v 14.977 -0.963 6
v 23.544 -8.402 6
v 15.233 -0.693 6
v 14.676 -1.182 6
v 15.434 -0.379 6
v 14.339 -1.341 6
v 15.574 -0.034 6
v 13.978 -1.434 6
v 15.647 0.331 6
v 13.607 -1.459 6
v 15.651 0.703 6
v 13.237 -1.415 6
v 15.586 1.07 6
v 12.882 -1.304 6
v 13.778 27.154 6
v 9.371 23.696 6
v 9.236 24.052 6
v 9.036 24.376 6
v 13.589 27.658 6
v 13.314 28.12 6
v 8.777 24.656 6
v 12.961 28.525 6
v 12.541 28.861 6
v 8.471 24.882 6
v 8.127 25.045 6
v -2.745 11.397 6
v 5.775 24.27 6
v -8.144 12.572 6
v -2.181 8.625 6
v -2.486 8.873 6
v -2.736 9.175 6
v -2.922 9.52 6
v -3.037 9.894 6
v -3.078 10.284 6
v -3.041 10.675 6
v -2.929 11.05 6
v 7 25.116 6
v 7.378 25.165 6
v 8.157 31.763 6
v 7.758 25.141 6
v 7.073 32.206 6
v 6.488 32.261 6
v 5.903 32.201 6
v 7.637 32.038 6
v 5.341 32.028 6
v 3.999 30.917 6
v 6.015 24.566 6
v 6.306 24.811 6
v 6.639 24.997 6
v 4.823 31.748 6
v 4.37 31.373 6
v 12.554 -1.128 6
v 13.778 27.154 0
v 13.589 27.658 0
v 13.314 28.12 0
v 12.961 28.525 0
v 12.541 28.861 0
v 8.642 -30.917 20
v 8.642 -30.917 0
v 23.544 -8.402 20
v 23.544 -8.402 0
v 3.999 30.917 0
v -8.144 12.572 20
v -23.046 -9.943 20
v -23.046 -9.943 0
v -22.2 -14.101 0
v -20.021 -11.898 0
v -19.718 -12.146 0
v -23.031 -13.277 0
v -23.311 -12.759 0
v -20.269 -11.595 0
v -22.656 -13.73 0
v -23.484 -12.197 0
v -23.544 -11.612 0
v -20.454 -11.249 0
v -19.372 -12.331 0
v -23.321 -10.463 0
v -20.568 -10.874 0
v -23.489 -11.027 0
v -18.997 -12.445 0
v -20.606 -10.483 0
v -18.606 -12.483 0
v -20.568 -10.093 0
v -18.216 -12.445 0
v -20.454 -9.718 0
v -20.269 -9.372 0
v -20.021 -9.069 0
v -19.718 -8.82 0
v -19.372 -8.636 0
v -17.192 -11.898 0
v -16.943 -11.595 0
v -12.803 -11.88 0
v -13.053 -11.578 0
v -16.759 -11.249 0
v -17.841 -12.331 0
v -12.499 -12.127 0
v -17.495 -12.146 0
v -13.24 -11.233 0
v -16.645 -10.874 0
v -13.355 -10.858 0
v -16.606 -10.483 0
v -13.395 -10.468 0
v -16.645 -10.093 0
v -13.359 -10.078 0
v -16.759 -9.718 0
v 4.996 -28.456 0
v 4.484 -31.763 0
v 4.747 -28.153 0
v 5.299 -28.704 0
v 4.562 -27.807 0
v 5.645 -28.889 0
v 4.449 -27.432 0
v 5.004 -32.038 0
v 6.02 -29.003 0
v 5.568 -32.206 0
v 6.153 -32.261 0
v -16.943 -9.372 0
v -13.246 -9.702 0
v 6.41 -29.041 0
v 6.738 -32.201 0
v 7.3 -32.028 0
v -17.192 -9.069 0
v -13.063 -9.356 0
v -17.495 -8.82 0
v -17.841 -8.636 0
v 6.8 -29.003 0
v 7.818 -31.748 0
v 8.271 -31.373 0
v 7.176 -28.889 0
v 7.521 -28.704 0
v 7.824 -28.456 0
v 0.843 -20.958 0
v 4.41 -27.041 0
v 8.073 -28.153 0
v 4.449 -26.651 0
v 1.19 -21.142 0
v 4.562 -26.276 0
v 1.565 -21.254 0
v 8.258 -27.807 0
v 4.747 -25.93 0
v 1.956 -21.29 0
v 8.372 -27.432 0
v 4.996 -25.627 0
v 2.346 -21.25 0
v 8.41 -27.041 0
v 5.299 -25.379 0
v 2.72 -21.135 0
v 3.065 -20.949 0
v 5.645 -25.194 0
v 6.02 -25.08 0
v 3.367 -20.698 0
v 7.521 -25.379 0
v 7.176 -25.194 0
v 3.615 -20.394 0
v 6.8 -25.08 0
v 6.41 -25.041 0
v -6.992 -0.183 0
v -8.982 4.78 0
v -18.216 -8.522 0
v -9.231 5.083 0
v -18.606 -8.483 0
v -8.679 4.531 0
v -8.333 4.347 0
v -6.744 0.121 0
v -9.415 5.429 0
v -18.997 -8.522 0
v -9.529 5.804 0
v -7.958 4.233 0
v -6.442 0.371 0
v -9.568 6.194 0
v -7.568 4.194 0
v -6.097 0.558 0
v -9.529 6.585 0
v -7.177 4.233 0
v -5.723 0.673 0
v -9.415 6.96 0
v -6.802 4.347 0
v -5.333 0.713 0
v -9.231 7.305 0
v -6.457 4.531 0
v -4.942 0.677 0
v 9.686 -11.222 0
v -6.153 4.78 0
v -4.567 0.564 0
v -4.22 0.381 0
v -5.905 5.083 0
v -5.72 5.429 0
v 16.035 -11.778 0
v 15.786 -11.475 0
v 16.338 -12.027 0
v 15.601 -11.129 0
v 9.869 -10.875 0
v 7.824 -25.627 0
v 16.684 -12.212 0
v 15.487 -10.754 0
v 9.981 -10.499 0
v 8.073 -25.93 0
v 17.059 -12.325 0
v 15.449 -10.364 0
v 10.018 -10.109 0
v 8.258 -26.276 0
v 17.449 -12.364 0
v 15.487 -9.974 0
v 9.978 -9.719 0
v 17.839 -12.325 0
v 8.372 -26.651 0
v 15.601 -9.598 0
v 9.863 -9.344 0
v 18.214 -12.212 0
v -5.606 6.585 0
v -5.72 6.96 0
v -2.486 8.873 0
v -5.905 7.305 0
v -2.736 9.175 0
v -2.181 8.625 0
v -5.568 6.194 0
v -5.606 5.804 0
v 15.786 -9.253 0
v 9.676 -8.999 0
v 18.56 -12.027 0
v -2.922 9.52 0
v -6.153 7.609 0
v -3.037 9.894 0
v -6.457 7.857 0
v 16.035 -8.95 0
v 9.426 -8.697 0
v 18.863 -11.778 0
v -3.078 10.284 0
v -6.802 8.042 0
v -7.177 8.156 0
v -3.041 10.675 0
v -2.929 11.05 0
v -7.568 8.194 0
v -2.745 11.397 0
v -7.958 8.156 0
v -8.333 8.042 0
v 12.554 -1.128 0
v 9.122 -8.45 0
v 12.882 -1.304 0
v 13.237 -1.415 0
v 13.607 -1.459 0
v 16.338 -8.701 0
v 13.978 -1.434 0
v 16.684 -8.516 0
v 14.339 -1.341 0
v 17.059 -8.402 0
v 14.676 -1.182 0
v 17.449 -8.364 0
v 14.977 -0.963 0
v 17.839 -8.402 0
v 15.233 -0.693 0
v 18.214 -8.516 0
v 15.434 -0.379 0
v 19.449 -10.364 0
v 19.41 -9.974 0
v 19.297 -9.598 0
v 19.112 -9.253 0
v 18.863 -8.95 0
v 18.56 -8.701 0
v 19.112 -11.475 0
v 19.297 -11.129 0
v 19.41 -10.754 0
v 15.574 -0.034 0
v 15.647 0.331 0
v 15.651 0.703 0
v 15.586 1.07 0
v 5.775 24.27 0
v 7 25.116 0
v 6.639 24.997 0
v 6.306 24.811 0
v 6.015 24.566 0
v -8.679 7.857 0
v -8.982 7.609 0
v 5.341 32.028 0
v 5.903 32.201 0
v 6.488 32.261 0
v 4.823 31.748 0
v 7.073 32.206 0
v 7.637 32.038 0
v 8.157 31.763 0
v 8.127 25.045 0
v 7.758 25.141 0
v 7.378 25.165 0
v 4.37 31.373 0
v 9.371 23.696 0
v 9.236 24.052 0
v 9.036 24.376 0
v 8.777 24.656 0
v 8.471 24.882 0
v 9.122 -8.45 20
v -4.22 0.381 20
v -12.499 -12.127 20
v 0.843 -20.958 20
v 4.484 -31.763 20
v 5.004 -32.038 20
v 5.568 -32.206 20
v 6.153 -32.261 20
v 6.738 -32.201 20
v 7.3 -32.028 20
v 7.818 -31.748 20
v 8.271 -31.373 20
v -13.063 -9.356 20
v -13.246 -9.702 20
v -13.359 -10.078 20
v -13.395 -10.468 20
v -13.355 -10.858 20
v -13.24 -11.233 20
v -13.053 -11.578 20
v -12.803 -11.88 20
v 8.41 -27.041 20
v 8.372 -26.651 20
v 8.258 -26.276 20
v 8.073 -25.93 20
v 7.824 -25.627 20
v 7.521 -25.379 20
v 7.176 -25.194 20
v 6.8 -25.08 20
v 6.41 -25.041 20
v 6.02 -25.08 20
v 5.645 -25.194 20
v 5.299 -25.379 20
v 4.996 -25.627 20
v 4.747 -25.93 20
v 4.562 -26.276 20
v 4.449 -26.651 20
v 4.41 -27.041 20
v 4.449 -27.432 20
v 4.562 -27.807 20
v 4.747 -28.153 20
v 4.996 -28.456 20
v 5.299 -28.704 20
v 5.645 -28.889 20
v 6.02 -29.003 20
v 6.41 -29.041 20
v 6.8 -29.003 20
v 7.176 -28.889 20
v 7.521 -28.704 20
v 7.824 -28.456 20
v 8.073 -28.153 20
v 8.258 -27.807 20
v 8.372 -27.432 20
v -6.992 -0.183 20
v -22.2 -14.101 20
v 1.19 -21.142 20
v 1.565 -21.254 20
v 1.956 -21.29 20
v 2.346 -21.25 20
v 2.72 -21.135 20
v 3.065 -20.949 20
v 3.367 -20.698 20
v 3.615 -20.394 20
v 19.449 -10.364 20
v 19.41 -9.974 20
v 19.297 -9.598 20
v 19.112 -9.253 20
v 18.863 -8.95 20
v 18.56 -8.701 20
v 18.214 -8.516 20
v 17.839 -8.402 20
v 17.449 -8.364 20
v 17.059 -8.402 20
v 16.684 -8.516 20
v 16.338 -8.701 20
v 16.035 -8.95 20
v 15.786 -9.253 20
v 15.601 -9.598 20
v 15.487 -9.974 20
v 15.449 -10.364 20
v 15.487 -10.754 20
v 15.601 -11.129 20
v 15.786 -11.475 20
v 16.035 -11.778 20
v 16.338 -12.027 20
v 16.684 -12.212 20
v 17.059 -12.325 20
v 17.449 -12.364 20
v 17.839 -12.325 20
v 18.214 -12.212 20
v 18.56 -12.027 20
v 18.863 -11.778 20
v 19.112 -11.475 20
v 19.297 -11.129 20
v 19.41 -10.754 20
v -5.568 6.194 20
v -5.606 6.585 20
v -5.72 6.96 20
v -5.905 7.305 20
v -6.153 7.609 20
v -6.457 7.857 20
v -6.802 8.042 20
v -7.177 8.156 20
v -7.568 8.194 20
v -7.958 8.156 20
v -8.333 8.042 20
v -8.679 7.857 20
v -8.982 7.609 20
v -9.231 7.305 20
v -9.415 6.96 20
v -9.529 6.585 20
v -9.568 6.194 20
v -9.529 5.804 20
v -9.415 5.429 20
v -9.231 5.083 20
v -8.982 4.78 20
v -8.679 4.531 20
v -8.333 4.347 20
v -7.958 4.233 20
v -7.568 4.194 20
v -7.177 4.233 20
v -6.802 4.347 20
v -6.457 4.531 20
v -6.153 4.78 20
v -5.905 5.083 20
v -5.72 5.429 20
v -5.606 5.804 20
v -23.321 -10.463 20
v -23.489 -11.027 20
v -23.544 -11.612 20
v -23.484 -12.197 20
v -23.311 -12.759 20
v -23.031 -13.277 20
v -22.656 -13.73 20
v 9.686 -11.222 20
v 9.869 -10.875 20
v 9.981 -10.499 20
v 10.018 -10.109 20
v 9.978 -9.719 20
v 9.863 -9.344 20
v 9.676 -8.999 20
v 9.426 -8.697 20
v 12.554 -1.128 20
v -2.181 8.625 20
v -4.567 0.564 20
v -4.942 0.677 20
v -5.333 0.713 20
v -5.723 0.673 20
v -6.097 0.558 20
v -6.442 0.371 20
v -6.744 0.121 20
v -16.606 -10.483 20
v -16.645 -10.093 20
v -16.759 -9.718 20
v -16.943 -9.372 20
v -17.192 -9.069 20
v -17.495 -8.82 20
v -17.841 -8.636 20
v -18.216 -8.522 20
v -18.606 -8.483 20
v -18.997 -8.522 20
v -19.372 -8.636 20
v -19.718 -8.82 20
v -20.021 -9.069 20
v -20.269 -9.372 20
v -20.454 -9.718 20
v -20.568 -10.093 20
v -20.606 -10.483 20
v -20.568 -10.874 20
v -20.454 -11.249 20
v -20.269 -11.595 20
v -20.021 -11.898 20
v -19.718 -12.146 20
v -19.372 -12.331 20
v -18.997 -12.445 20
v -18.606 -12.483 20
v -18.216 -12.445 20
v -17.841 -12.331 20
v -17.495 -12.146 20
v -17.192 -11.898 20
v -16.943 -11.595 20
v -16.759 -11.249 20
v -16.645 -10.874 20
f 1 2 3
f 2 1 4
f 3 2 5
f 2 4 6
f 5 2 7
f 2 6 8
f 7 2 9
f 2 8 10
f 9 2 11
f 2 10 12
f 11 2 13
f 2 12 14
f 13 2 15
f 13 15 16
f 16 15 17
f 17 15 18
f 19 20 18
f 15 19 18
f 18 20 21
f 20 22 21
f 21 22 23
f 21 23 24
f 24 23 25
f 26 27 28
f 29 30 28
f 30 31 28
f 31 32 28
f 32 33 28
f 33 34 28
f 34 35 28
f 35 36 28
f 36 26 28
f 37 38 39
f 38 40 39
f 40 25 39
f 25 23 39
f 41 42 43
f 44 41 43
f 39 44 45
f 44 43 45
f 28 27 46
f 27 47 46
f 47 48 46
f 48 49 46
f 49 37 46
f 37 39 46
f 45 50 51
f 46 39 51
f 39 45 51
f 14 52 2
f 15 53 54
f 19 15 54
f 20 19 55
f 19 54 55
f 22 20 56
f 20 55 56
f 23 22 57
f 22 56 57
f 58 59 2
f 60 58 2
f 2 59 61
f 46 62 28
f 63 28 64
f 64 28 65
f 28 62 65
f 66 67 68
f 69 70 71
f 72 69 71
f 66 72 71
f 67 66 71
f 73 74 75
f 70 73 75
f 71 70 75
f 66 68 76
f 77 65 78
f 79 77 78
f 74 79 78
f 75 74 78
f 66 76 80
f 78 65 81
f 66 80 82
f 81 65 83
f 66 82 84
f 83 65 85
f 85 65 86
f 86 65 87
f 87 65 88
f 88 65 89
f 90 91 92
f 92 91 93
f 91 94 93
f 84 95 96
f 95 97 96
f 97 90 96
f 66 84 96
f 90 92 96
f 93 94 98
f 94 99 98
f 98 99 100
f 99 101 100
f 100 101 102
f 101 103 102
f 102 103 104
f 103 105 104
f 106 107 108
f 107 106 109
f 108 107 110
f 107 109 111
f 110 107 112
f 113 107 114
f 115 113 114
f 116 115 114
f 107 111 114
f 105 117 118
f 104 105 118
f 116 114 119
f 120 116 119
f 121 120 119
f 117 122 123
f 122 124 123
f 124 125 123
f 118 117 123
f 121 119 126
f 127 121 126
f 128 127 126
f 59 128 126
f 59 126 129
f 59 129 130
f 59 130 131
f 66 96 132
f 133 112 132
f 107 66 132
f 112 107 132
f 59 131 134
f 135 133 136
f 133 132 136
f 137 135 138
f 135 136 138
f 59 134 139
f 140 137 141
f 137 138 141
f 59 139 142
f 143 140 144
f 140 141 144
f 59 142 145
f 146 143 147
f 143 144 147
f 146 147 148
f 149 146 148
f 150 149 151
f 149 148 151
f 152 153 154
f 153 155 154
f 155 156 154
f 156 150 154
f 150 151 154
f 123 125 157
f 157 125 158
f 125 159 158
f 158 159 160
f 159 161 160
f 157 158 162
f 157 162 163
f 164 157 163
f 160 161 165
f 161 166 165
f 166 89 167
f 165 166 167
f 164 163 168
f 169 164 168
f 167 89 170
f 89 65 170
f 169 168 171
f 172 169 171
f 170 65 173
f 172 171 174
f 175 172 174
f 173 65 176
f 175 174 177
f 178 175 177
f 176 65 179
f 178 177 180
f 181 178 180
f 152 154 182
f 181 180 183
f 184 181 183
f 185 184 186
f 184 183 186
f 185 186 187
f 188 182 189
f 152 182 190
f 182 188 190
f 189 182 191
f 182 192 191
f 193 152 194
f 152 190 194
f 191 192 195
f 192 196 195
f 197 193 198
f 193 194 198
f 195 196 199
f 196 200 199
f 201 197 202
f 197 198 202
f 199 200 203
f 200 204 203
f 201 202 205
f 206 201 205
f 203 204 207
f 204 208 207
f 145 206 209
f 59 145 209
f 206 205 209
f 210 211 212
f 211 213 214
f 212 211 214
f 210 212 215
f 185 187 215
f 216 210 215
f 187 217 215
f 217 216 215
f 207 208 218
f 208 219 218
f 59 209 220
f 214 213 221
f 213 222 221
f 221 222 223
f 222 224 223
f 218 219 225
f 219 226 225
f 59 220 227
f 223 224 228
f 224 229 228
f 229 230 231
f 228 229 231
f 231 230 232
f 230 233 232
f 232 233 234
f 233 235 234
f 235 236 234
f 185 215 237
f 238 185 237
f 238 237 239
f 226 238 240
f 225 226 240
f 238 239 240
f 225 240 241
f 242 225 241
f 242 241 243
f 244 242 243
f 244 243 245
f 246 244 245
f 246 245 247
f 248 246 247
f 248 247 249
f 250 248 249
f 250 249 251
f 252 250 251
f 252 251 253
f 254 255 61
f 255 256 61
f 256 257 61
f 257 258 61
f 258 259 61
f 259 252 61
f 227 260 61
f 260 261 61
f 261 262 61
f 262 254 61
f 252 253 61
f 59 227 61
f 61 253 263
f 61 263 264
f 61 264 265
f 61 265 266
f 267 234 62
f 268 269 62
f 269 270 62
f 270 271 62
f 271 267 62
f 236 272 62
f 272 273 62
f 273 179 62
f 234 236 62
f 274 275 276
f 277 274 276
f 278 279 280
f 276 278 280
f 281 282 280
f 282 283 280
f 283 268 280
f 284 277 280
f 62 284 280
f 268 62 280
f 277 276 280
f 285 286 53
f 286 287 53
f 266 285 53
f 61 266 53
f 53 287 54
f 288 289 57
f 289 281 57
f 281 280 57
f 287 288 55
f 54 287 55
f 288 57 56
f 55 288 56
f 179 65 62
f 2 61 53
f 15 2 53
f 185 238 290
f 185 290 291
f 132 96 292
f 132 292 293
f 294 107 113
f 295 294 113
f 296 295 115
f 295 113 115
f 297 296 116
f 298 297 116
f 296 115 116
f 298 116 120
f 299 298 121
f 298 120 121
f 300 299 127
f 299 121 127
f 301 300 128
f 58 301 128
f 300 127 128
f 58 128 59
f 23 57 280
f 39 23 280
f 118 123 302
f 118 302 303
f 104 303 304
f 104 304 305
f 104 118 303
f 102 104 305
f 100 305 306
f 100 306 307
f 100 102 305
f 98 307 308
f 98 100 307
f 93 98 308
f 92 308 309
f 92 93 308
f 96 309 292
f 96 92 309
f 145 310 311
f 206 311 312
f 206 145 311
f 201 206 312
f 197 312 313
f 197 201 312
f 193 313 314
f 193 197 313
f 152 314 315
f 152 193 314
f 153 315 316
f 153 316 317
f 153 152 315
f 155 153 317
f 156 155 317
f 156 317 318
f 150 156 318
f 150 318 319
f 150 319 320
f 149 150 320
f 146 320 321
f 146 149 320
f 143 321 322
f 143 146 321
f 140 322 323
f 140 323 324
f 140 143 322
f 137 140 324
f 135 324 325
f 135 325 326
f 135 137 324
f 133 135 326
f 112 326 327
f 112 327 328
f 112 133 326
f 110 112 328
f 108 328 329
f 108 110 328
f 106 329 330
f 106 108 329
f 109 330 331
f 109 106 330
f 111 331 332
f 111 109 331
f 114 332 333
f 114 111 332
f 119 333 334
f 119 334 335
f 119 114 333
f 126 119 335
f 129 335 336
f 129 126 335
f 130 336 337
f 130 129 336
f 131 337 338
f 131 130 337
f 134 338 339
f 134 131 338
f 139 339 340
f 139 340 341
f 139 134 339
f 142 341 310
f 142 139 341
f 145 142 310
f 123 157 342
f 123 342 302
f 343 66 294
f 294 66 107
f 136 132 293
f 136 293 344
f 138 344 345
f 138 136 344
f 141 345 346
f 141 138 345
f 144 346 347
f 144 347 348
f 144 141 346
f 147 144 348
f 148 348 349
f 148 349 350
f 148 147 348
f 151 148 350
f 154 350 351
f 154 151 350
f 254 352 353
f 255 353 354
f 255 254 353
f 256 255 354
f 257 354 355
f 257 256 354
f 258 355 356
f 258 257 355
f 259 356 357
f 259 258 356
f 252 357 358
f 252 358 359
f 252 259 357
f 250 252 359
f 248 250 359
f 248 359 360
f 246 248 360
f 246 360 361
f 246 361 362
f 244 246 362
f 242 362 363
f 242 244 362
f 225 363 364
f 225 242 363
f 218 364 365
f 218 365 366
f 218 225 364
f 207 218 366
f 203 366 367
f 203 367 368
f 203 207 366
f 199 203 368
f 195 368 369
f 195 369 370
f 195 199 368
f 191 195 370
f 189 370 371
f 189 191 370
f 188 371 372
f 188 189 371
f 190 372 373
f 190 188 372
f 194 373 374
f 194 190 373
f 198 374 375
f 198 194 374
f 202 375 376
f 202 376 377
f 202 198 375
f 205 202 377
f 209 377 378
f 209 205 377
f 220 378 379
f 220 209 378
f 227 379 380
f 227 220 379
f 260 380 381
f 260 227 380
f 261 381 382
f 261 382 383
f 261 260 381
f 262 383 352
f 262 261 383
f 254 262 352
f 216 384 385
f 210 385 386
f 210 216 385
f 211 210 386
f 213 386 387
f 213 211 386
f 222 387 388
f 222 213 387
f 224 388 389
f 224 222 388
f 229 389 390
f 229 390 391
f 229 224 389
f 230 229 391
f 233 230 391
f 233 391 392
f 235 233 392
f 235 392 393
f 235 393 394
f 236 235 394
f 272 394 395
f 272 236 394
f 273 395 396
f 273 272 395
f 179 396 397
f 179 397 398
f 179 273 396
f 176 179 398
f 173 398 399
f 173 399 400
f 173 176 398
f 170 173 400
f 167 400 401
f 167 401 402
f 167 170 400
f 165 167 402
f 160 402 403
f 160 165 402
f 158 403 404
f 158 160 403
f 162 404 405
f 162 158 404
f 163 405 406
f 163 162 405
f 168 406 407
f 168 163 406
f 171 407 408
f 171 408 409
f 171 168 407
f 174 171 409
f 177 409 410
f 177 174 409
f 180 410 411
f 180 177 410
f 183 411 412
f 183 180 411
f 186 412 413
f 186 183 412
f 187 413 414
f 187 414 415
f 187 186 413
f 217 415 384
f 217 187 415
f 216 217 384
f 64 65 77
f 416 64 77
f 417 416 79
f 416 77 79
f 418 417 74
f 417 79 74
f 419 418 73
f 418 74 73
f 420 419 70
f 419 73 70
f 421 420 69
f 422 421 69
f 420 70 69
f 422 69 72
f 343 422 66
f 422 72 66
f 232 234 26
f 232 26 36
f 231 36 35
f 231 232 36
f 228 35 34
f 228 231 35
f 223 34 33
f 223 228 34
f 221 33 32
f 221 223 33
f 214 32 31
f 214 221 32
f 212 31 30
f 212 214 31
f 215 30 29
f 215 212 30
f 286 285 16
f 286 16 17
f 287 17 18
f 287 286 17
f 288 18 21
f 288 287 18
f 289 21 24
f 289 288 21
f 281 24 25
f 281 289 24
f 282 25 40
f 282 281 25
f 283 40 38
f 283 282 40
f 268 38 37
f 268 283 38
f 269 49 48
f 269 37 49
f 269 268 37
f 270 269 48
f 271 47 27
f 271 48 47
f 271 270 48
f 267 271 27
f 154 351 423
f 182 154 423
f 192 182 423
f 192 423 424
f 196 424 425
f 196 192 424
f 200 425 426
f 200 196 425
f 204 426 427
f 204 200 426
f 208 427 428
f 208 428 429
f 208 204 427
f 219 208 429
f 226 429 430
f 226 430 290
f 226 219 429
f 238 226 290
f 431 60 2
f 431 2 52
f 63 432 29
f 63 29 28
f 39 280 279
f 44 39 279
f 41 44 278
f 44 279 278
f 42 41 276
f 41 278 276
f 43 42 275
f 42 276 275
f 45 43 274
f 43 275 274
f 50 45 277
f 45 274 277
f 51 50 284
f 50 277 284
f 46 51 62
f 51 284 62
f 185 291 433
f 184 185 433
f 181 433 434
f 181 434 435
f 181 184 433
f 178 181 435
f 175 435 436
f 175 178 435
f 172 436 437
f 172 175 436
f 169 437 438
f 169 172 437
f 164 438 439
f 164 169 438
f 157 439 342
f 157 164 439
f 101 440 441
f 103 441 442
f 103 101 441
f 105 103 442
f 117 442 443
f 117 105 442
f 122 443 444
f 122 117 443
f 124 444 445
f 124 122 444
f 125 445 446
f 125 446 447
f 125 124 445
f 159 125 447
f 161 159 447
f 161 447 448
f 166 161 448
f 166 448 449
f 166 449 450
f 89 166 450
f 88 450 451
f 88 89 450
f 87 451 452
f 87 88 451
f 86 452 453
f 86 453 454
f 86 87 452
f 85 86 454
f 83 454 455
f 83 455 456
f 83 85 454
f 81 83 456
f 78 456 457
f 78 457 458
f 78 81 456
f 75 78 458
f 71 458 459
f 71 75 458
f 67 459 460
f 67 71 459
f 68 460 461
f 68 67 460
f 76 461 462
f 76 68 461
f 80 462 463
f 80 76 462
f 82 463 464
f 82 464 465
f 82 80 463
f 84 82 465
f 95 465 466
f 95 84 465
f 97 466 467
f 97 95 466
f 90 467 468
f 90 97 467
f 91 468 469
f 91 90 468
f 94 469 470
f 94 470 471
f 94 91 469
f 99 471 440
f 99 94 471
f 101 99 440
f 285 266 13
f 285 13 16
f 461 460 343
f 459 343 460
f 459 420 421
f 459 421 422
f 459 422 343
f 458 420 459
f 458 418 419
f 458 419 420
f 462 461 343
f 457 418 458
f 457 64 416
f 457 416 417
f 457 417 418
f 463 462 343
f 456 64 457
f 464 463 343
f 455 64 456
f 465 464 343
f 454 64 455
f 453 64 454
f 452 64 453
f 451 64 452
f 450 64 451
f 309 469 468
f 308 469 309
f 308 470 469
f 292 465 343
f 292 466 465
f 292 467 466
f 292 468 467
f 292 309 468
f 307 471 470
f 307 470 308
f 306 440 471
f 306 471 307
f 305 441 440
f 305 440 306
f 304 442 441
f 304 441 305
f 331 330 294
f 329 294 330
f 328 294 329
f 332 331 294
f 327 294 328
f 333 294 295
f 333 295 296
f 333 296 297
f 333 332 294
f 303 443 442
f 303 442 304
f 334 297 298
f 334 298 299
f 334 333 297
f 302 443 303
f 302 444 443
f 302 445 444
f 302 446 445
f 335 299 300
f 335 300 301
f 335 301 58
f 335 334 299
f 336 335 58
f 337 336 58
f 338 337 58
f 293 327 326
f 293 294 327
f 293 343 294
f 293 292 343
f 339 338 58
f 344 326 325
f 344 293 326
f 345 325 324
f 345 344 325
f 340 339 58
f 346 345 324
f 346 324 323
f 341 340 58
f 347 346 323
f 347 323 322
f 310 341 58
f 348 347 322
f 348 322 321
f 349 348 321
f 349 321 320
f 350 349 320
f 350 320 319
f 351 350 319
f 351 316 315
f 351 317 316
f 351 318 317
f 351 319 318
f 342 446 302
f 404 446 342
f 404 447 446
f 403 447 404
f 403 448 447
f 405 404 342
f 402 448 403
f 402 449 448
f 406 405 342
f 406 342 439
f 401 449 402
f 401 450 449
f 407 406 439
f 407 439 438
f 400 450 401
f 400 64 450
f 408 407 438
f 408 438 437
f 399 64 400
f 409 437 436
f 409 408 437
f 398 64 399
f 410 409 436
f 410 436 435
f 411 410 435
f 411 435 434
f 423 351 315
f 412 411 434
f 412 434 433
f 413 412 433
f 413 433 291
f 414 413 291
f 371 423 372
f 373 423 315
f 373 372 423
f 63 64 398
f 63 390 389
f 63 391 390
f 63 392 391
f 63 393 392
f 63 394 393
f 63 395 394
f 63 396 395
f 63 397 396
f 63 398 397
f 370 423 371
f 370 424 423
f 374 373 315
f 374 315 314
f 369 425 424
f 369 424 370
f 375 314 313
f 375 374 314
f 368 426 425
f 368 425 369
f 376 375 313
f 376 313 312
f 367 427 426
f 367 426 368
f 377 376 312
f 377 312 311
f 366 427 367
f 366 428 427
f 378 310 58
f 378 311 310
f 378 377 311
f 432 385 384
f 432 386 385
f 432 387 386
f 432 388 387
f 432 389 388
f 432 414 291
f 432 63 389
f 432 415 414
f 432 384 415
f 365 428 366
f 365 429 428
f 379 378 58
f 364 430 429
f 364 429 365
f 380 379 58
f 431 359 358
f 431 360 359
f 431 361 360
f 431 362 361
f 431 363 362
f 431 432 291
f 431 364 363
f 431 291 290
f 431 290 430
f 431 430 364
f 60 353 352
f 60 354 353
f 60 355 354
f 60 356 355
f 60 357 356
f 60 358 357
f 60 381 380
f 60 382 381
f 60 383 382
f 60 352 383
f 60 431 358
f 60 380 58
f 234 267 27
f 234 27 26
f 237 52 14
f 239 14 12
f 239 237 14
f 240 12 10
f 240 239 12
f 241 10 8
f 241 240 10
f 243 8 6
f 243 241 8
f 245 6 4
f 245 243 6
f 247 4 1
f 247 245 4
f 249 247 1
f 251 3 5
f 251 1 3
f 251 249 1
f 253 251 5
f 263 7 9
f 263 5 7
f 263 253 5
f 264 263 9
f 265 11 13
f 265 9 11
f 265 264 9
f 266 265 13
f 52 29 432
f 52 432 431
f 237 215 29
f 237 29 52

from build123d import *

# Parameters (mm, degrees)
SKETCH_1_R          = 2
EXTRUDE_1_DEPTH     = 20
CUT_EXTRUDE_2_DEPTH = 14


with BuildPart() as part:
    # 草图1 → 凸台-拉伸1 (new body)
    with BuildSketch(Plane.XY):
        with BuildLine():
            Line((8.641852584, -30.917005362), (23.544151188, -8.402088166))
            Line((23.544151188, -8.402088166), (13.777542747, 27.154145307))
            ThreePointArc((13.777542747, 27.154145307), (13.313905715, 28.119907916), (12.540501442, 28.861192305))
            Line((12.540501442, 28.861192305), (8.156572048, 31.762851872))
            ThreePointArc((8.156572048, 31.762851872), (5.902657289, 32.20096852), (3.999103626, 30.917005362))
            Line((3.999103626, 30.917005362), (-23.045808654, -9.94339992))
            ThreePointArc((-23.045808654, -9.94339992), (-23.483925302, -12.197314679), (-22.199962144, -14.100868342))
            Line((-22.199962144, -14.100868342), (4.484384162, -31.762851872))
            ThreePointArc((4.484384162, -31.762851872), (6.738298922, -32.20096852), (8.641852584, -30.917005362))
        make_face()
        with Locations((6.410183267, -27.041485776)):
            Circle(SKETCH_1_R, mode=Mode.SUBTRACT)
        with Locations((17.448922973, -10.363769335)):
            Circle(SKETCH_1_R, mode=Mode.SUBTRACT)
        with Locations((-18.606391395, -10.483376217)):
            Circle(SKETCH_1_R, mode=Mode.SUBTRACT)
        with Locations((-7.567651689, 6.194340225)):
            Circle(SKETCH_1_R, mode=Mode.SUBTRACT)
        with BuildLine():
            Line((3.614616276, -20.394320576), (9.685923114, -11.221576533))
            ThreePointArc((9.685923114, -11.221576533), (9.978000879, -9.718966694), (9.122025441, -8.449930919))
            Line((9.122025441, -8.449930919), (-4.220147712, 0.381060846))
            ThreePointArc((-4.220147712, 0.381060846), (-5.722757552, 0.673138612), (-6.991793327, -0.182836827))
            Line((-6.991793327, -0.182836827), (-13.063100166, -9.35558087))
            ThreePointArc((-13.063100166, -9.35558087), (-13.355177931, -10.858190709), (-12.499202492, -12.127226485))
            Line((-12.499202492, -12.127226485), (0.842970661, -20.95821825))
            ThreePointArc((0.842970661, -20.95821825), (2.3455805, -21.250296015), (3.614616276, -20.394320576))
        make_face(mode=Mode.SUBTRACT)
        with BuildLine():
            Line((-2.181398369, 8.62528164), (12.553966944, -1.1278439))
            ThreePointArc((12.553966944, -1.1278439), (14.831422966, -1.079549075), (15.586409089, 1.069668056))
            Line((15.586409089, 1.069668056), (9.371464219, 23.695744666))
            ThreePointArc((9.371464219, 23.695744666), (7.758191259, 25.140995222), (5.775124401, 24.269878325))
            Line((5.775124401, 24.269878325), (-2.745296043, 11.396927255))
            ThreePointArc((-2.745296043, 11.396927255), (-3.037373808, 9.894317415), (-2.181398369, 8.62528164))
        make_face(mode=Mode.SUBTRACT)
    extrude(amount=EXTRUDE_1_DEPTH)

    # 草图2 → 切除-拉伸2 (cut)
    with BuildSketch(Plane.XY.offset(20)):
        Polygon((23.544151188, -8.402088166), (-8.143510051, 12.571517276), (4.702402911, 35.561922015), (37.191732114, 19.156948223), align=None)
    extrude(amount=-CUT_EXTRUDE_2_DEPTH, mode=Mode.SUBTRACT)


solid = part.part
